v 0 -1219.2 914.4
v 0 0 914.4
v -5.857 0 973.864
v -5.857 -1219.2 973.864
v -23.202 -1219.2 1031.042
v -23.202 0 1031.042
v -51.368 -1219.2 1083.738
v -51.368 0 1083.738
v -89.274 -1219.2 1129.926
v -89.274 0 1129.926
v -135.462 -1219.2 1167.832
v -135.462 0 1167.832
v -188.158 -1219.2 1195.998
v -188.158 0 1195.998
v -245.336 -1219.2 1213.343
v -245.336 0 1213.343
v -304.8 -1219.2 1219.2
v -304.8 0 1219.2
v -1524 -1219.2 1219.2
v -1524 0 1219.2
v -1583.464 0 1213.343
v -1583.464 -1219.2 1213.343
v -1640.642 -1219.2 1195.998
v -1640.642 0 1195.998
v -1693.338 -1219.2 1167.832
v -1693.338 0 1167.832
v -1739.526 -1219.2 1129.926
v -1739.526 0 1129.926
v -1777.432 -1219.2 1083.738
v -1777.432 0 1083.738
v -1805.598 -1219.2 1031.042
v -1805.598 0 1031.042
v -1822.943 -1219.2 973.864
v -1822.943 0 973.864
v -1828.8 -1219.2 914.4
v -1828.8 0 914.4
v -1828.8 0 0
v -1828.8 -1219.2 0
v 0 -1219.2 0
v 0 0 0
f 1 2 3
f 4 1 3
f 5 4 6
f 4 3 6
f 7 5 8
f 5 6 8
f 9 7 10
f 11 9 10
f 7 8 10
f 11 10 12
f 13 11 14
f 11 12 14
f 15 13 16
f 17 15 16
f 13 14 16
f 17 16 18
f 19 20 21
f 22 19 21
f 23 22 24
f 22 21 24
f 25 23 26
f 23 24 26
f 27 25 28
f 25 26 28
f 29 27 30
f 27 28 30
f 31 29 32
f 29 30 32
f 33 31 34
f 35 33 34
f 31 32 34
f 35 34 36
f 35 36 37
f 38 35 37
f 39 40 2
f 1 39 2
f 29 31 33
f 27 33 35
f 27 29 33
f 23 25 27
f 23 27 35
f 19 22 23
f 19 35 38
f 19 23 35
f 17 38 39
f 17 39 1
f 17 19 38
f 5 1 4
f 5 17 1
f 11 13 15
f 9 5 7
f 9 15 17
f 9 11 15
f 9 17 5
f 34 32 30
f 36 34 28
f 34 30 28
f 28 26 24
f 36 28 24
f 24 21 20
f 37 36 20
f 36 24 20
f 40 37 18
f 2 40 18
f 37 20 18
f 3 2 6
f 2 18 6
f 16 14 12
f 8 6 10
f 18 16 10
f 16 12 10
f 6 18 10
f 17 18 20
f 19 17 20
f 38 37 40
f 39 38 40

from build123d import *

# Parameters (mm, degrees)
F1_DEPTH = 1219.2


with BuildPart() as f1:
    # F0 (on Front) → F1 (new body)
    with BuildSketch(Plane.XZ):
        with BuildLine():
            Line((-1828.8, 0), (0, 0))
            Line((0, 0), (0, 914.4))
            ThreePointArc((0, 914.4), (-89.273853, 1129.926147), (-304.8, 1219.2))
            Line((-304.8, 1219.2), (-1524, 1219.2))
            ThreePointArc((-1524, 1219.2), (-1739.526147, 1129.926147), (-1828.8, 914.4))
            Line((-1828.8, 914.4), (-1828.8, 0))
        make_face()
    extrude(amount=F1_DEPTH)


solid = f1.part
